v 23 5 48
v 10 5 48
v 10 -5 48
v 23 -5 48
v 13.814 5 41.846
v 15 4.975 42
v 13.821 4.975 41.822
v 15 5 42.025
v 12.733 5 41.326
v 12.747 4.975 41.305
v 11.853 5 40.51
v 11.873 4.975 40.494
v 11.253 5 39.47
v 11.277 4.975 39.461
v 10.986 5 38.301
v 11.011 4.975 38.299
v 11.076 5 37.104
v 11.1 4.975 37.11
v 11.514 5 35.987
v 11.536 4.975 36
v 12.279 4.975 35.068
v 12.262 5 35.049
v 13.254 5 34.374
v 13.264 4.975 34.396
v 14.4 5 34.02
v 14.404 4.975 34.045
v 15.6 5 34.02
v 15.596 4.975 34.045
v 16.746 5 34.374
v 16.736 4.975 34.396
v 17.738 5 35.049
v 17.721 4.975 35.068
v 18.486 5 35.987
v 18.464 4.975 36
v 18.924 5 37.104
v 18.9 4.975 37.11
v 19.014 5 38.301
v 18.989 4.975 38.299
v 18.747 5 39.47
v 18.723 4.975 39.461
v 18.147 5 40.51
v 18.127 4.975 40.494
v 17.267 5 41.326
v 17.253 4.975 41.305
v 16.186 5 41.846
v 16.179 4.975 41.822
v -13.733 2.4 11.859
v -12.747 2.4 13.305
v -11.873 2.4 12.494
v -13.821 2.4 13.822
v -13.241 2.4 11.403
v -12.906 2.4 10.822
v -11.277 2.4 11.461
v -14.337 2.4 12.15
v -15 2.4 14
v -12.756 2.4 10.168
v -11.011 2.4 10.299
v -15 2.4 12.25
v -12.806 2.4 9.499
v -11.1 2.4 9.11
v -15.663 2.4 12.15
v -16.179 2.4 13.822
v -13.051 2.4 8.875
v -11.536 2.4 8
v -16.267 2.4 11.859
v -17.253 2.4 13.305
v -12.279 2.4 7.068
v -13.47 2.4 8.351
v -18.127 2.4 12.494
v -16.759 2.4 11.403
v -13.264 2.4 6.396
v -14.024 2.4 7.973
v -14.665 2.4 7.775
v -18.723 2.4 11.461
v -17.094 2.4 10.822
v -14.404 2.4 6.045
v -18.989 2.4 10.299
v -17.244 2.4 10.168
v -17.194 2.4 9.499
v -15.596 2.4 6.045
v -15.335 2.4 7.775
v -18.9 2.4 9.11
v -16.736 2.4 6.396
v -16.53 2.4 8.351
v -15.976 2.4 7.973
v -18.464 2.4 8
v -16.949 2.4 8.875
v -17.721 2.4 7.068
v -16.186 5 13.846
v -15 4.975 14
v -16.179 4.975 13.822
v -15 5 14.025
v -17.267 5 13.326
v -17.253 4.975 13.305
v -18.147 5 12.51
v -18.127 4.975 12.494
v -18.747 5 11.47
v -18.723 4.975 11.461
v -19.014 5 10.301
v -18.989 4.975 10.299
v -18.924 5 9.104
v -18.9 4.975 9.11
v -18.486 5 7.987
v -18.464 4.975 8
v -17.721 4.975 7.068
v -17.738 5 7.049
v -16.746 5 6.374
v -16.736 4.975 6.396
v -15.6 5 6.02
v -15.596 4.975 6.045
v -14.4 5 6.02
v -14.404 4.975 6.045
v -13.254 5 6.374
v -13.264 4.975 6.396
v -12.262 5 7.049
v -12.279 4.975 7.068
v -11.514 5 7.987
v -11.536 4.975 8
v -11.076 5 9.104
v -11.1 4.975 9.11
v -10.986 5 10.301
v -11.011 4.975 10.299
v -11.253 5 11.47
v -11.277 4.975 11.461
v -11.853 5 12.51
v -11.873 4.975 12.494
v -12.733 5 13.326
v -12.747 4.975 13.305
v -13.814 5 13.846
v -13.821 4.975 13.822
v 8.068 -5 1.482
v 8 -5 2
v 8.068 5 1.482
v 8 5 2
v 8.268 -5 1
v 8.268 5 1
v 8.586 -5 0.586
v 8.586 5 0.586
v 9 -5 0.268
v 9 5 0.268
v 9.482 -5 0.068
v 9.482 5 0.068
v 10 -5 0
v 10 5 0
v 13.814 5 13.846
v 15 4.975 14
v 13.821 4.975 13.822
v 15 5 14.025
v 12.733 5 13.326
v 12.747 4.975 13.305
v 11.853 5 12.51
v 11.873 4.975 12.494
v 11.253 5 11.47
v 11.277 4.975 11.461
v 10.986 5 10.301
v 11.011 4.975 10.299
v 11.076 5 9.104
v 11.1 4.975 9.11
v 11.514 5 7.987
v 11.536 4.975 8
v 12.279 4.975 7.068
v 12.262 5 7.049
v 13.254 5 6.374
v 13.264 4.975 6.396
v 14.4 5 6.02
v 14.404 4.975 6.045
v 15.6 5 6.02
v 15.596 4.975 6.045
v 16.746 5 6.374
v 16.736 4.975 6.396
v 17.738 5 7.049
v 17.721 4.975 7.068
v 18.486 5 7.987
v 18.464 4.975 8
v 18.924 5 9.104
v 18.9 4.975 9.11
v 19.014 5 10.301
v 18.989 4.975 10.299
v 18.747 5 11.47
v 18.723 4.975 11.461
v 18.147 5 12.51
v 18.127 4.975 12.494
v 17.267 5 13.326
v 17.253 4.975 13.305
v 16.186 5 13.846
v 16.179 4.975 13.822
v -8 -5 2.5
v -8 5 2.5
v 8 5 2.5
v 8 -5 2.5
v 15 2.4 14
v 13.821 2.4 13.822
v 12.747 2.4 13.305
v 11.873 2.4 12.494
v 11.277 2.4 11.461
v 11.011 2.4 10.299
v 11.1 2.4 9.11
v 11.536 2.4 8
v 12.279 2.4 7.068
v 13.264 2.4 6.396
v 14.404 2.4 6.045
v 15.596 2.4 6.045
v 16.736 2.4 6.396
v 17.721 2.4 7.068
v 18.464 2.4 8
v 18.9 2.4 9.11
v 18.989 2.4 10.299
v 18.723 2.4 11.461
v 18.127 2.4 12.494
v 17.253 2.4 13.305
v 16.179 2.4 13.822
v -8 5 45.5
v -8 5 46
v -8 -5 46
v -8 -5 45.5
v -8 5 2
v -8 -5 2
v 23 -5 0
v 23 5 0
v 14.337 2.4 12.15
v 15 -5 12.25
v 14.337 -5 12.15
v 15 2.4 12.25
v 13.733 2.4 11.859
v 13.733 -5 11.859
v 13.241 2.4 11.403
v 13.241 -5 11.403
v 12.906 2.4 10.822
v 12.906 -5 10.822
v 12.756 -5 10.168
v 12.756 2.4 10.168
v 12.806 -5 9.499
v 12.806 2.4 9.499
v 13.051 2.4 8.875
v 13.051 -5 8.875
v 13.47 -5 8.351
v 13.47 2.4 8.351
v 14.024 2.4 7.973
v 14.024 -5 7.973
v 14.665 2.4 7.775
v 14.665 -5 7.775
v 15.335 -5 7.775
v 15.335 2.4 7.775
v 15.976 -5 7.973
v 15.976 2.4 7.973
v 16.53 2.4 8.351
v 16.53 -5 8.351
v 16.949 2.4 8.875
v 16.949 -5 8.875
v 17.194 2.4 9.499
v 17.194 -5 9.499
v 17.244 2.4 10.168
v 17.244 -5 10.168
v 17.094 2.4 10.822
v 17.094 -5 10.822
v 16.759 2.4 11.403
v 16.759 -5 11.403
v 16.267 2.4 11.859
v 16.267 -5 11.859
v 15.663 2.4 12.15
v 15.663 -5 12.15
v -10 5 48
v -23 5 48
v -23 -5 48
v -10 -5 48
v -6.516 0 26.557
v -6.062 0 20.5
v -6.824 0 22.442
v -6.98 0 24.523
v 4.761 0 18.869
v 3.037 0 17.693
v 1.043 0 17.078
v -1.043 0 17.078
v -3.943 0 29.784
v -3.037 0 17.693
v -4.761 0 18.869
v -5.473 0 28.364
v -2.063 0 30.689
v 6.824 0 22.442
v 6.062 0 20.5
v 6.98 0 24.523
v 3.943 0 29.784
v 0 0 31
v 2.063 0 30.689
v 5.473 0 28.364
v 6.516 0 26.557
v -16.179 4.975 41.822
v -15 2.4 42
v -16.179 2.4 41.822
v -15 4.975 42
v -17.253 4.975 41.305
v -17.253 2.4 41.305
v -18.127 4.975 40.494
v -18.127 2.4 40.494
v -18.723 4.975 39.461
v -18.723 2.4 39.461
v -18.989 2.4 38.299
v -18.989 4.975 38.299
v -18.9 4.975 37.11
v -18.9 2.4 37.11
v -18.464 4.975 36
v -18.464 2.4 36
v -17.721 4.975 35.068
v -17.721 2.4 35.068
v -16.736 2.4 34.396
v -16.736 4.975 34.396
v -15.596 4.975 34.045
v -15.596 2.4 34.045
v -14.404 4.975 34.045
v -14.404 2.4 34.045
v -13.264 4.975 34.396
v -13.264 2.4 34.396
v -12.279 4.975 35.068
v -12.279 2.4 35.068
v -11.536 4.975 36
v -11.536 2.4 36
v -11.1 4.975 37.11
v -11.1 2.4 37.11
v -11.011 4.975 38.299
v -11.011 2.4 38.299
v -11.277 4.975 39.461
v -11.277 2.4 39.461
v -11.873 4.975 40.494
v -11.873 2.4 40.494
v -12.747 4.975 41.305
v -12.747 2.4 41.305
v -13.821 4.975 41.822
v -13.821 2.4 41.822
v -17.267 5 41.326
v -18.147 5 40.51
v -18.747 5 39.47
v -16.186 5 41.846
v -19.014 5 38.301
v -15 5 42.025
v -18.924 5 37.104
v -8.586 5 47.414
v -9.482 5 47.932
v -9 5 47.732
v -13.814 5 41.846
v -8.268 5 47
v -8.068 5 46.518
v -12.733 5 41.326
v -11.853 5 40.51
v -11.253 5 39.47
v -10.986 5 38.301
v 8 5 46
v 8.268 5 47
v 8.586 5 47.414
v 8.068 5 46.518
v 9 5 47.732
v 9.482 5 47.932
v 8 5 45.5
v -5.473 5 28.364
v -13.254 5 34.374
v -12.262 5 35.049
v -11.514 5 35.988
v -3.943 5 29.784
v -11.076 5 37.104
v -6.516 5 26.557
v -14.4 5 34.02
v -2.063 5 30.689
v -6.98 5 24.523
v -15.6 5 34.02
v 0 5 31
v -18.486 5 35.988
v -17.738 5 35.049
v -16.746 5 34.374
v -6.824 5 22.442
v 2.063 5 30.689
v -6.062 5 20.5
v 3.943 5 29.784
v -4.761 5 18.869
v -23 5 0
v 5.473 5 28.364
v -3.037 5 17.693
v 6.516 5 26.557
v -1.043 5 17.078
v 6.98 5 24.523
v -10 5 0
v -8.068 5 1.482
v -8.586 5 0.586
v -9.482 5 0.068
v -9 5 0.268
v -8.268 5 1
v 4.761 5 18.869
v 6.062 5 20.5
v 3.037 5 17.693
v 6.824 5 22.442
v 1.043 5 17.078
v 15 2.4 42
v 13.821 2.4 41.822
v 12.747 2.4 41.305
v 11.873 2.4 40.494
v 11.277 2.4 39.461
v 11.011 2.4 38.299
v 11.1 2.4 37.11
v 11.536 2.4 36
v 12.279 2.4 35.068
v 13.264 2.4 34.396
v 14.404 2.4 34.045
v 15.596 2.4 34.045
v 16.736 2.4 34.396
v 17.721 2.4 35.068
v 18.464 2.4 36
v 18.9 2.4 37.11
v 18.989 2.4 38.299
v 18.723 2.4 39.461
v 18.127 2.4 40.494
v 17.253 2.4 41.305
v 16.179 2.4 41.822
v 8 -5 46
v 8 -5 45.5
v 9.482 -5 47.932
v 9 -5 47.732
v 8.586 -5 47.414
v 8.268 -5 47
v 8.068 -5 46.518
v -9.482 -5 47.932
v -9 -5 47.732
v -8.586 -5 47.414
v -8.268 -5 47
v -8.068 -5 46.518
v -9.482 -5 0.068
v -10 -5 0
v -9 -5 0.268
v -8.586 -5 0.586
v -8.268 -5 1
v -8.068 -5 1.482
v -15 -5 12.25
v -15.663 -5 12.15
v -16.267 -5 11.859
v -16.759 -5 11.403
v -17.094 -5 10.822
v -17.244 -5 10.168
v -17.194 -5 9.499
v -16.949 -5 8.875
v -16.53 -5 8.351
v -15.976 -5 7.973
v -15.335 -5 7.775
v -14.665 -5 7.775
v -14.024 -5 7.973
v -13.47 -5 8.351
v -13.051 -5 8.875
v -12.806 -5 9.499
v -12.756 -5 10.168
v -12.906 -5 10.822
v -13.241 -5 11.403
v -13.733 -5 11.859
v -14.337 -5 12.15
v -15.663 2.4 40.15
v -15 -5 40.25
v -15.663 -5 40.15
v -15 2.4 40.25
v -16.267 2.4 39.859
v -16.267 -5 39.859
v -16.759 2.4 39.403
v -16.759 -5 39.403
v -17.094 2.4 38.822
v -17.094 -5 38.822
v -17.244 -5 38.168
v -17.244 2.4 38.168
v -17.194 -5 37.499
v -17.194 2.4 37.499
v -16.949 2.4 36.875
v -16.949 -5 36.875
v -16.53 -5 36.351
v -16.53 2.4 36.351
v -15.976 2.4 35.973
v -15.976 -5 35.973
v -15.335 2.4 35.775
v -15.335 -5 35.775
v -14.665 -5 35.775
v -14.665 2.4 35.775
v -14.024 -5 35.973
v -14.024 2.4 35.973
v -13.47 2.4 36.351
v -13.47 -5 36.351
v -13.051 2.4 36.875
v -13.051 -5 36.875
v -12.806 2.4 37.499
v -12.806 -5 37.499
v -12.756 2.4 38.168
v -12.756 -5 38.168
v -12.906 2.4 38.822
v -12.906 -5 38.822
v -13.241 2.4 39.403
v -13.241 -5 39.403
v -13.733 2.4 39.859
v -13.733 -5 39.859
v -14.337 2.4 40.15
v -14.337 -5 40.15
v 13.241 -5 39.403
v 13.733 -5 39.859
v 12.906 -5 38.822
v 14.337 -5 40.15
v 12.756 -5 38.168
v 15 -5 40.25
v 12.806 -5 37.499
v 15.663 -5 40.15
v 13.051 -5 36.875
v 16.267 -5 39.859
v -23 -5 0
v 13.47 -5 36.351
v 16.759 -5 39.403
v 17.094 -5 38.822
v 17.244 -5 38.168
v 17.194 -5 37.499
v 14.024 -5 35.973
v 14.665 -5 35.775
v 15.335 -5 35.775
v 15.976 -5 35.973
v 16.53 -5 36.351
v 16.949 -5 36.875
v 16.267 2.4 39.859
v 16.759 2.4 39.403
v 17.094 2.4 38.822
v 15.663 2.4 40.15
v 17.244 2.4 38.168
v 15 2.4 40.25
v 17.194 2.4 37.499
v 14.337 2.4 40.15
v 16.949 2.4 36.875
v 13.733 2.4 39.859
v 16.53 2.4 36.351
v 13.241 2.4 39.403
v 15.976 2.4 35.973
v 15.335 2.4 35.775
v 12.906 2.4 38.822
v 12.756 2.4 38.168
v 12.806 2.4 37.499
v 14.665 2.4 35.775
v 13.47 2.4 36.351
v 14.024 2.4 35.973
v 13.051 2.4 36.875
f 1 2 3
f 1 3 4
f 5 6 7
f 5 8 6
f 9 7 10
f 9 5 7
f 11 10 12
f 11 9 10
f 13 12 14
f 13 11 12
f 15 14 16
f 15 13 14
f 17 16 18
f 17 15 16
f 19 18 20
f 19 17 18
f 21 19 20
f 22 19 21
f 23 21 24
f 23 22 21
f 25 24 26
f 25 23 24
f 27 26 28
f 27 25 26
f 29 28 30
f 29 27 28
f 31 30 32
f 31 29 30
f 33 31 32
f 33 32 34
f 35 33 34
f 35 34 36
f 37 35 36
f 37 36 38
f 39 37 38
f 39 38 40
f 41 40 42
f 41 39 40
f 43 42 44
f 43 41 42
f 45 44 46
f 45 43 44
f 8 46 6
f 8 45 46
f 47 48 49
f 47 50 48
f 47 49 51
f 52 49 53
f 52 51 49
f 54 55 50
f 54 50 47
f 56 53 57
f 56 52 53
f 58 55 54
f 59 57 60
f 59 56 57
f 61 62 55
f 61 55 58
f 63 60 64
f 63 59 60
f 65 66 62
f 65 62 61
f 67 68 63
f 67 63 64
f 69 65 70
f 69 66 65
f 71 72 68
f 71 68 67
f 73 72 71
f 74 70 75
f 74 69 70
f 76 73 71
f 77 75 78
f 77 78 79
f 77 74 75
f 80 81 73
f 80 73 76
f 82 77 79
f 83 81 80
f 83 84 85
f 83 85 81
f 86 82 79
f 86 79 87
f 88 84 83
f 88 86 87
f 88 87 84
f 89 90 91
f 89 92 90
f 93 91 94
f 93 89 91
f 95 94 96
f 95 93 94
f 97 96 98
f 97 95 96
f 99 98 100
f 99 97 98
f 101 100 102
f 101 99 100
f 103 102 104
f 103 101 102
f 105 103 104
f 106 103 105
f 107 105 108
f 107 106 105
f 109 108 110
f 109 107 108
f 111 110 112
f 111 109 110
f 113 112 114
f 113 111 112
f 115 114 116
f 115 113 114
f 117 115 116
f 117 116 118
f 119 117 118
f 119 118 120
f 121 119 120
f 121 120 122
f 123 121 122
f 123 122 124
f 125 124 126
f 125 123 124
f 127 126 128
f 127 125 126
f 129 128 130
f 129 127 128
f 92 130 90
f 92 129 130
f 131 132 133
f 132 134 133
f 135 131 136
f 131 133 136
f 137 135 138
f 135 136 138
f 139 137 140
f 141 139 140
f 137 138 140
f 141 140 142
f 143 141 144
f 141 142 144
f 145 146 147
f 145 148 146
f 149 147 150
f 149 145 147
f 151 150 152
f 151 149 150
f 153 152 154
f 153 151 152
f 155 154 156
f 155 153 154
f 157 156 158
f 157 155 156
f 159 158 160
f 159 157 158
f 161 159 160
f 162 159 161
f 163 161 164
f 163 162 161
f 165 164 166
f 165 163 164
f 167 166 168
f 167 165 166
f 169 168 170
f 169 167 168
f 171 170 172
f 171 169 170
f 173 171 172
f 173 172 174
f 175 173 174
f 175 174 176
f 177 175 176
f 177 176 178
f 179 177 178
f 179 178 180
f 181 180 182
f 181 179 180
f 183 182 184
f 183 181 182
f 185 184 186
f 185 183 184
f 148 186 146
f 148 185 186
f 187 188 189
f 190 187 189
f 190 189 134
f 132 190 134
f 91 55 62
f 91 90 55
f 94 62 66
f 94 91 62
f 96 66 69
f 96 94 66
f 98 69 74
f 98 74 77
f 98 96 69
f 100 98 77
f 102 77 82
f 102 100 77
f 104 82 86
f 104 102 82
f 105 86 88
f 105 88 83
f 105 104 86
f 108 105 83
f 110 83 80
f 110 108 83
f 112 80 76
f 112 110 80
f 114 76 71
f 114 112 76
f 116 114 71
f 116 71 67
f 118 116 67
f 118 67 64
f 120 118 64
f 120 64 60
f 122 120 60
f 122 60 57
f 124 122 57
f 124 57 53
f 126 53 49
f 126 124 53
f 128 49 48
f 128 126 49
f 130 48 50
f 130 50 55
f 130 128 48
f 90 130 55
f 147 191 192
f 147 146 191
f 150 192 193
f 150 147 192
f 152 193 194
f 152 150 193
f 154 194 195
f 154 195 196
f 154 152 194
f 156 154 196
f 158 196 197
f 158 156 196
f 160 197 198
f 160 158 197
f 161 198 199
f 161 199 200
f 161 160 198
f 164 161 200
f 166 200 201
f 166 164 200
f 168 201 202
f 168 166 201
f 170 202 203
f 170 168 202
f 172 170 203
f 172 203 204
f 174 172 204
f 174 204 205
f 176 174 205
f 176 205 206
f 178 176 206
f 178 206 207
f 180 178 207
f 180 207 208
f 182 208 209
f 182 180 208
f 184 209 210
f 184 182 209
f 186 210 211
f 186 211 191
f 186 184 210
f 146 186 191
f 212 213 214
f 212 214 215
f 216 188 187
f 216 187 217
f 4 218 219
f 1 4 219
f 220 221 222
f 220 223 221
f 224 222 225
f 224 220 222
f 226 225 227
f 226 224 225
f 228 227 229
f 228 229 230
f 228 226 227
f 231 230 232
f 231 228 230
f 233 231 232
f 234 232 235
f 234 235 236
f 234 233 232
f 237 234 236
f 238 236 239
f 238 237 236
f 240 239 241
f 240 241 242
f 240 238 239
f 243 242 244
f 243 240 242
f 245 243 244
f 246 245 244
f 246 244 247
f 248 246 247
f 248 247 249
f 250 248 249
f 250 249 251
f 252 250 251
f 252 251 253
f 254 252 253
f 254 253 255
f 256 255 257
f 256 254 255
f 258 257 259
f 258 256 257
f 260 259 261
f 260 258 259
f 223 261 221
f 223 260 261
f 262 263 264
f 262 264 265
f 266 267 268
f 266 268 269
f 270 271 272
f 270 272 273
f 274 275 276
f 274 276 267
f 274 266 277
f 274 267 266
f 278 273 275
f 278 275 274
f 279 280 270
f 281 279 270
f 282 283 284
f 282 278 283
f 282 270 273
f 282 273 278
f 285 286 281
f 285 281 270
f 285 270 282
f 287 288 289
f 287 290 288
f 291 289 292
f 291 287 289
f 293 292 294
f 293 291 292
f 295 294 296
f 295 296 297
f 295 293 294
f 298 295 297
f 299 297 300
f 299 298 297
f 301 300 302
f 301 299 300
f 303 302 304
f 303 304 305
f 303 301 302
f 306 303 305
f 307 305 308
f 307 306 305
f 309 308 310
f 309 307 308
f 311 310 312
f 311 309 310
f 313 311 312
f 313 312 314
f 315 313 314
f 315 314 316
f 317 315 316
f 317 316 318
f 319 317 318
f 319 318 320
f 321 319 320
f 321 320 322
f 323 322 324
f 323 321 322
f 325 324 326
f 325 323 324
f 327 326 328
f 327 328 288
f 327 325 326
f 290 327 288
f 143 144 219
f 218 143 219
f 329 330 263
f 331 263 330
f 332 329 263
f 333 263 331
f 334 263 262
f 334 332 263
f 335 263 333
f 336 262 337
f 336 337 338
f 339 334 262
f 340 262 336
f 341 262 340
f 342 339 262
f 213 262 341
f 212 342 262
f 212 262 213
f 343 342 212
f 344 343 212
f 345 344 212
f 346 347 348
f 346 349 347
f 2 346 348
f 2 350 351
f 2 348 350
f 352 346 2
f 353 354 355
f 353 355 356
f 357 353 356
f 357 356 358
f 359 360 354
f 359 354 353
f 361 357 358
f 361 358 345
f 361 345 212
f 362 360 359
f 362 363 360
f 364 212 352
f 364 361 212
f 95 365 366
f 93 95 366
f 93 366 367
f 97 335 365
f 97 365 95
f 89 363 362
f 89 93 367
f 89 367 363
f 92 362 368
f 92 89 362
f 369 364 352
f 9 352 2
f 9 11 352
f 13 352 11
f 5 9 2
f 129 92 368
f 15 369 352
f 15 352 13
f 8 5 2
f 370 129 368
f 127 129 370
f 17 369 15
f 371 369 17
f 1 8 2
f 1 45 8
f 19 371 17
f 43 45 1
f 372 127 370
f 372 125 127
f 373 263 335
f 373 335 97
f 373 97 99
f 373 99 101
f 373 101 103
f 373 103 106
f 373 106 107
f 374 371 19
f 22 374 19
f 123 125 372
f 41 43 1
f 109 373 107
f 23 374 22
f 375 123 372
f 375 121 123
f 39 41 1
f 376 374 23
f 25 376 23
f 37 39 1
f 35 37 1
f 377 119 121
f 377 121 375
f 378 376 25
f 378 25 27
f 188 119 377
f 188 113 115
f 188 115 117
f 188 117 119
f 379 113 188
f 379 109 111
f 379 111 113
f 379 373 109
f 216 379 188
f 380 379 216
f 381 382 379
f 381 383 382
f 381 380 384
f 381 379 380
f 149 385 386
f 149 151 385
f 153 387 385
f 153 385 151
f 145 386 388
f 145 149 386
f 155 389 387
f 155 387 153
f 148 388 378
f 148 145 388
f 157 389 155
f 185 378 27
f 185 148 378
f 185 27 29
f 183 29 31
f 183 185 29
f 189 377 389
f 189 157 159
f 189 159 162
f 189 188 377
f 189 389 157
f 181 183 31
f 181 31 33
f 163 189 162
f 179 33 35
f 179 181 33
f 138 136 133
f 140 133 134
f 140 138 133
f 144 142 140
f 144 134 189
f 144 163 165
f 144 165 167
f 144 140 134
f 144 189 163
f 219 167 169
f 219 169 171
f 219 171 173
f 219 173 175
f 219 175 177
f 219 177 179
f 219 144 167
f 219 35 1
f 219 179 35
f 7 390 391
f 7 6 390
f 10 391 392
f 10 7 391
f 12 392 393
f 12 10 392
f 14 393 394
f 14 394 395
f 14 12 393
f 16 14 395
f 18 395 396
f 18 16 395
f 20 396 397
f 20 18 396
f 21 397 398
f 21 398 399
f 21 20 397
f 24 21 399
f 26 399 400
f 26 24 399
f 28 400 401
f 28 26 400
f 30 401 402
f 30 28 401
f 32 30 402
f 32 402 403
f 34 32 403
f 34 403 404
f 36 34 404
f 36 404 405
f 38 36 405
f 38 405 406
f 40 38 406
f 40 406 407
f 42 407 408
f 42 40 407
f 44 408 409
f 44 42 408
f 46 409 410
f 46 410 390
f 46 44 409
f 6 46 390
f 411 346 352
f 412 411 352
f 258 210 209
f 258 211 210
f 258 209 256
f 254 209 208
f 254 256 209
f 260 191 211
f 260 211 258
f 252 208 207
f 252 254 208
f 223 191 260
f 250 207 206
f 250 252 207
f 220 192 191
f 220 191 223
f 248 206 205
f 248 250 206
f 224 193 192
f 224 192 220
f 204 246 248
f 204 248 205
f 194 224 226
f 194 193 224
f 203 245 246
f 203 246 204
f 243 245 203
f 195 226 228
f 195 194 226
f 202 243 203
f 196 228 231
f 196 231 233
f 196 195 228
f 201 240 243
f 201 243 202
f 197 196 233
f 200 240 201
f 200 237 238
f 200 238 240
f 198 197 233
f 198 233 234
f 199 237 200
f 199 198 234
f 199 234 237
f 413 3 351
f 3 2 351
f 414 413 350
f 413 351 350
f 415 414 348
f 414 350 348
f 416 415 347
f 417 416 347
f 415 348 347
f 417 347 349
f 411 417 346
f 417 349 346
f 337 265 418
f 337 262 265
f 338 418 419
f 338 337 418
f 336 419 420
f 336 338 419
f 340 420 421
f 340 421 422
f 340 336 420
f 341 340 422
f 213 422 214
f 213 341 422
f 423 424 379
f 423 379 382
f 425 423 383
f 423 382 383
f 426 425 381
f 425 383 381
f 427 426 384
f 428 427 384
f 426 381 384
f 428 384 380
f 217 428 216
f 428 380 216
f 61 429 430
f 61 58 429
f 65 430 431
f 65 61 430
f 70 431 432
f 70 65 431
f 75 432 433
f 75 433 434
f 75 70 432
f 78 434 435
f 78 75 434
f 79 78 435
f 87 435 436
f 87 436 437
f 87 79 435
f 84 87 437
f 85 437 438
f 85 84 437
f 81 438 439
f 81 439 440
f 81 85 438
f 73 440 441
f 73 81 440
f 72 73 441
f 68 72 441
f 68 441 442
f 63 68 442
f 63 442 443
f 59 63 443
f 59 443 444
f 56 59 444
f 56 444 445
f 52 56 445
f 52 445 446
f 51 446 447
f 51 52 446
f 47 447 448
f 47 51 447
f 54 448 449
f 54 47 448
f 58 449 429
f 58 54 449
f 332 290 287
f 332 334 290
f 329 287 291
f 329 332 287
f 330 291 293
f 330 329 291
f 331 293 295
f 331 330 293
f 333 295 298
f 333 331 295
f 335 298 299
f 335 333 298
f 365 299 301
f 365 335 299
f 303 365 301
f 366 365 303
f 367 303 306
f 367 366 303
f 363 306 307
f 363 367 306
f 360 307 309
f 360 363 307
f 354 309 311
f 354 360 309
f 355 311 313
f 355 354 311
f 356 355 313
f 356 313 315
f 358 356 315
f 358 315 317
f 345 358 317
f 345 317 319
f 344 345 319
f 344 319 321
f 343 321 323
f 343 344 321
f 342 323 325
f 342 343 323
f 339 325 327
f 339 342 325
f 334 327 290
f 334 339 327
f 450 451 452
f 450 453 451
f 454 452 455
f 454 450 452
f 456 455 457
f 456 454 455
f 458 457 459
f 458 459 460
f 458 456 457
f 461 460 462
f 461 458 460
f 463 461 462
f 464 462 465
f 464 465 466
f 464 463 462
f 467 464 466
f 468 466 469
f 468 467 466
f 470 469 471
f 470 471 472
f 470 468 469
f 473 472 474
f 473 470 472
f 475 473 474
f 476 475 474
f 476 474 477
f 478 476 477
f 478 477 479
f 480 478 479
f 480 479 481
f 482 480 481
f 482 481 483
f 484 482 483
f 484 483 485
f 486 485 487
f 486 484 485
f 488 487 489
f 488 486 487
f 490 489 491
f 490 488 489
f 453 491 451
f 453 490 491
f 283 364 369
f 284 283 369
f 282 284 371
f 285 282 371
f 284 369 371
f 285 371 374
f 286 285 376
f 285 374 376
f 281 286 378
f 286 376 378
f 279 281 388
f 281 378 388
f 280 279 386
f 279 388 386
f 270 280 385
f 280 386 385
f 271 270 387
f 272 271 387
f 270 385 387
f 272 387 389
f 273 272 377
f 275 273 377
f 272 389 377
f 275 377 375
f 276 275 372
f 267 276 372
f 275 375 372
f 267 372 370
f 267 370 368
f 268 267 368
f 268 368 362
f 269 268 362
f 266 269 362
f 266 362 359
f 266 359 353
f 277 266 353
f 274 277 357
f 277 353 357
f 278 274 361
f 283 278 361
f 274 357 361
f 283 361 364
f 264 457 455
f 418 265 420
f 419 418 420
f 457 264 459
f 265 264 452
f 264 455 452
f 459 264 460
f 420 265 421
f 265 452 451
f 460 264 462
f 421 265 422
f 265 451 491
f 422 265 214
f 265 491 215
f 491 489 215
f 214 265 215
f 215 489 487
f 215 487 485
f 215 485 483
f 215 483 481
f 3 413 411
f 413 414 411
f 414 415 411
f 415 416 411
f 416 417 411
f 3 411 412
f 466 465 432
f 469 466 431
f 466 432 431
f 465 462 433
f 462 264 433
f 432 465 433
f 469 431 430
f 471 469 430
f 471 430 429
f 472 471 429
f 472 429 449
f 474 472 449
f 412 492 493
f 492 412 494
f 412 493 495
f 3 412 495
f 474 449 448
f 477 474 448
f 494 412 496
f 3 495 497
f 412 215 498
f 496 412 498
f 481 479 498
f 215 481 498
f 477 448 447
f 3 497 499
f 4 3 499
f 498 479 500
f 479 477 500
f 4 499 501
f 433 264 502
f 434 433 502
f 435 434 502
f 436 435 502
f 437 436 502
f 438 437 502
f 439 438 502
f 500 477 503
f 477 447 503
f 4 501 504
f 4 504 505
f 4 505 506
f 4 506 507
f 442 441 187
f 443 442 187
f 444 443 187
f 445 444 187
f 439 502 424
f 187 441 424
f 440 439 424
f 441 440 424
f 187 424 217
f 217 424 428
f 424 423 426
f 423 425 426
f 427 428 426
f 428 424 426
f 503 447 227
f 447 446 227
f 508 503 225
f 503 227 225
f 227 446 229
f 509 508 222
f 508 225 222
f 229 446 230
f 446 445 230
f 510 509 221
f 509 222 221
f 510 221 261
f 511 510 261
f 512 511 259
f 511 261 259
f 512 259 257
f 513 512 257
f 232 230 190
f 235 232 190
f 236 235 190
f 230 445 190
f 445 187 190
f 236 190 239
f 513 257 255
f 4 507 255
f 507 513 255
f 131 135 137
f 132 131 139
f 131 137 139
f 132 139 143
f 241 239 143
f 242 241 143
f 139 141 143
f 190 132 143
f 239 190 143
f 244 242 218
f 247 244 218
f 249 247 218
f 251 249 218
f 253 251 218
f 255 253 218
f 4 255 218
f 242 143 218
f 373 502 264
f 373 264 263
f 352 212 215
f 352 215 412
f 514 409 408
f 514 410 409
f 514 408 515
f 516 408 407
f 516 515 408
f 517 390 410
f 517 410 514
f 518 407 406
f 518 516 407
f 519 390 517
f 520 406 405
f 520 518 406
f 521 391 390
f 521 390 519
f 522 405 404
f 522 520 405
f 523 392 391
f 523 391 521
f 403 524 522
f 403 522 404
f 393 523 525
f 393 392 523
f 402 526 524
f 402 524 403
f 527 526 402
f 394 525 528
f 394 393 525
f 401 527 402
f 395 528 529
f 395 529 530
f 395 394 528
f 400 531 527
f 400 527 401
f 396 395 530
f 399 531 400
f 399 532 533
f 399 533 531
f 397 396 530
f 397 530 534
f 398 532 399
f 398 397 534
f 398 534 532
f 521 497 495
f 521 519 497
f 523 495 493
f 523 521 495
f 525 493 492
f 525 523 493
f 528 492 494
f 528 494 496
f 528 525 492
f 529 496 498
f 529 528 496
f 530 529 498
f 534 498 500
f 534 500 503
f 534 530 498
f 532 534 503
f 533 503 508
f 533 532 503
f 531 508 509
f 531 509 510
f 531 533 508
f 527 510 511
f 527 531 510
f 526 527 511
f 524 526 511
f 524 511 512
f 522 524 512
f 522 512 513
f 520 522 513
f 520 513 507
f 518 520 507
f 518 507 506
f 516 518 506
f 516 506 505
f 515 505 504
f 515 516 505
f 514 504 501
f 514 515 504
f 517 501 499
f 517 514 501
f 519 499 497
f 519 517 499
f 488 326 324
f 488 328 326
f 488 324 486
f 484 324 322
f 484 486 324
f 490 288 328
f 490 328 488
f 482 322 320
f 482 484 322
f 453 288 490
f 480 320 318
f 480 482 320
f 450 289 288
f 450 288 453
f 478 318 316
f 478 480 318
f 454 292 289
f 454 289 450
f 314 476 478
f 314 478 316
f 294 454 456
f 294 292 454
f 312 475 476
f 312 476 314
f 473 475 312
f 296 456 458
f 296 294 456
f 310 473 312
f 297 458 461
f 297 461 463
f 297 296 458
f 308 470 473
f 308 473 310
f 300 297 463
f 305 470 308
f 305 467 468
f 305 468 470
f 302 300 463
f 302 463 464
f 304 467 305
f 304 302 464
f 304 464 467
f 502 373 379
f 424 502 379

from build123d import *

# Parameters (mm, degrees)
SKETCH1_W                                  = 46
SKETCH1_H                                  = 10
BOSS_EXTRUDE1_DEPTH                        = 48
SKETCH2_W                                  = 16
SKETCH2_H                                  = 5
CUT_EXTRUDE1_DEPTH                         = 10
FILLET1_R                                  = 2
CBORE_FOR_M4_CHEESE_HEAD_SCREW1_AT_2_COUNT = 2
CBORE_FOR_M4_CHEESE_HEAD_SCREW1_AT_2_PITCH = 28
CBORE_FOR_M4_CHEESE_HEAD_SCREW1_AT_3_COUNT = 2
CBORE_FOR_M4_CHEESE_HEAD_SCREW1_AT_3_PITCH = 41.036569057
CBORE_FOR_M4_CHEESE_HEAD_SCREW1_AT_4_COUNT = 2
CBORE_FOR_M4_CHEESE_HEAD_SCREW1_AT_4_PITCH = 30
SKETCH6_R                                  = 7
CUT_EXTRUDE2_DEPTH                         = 5


with BuildPart() as part:
    # Sketch1 → Boss-Extrude1 (new body)
    with BuildSketch(Plane.XY):
        Rectangle(SKETCH1_W, SKETCH1_H)
    extrude(amount=BOSS_EXTRUDE1_DEPTH)

    # Sketch2 → Cut-Extrude1 (cut)
    with BuildSketch(Plane(origin=(0, 5, 0), x_dir=(1, 0, 0), z_dir=(0, 1, 0))):
        with Locations((0, -48)):
            Rectangle(SKETCH2_W, SKETCH2_H)
        Rectangle(SKETCH2_W, SKETCH2_H)
    extrude(amount=-CUT_EXTRUDE1_DEPTH, mode=Mode.SUBTRACT)

    # Fillet1
    fillet1_edges = [part.edges().sort_by_distance(p)[0] for p in [
        (-8, 0, 0),
        (8, 0, 0),
        (8, 0, 48),
        (-8, 0, 48),
    ]]
    fillet(fillet1_edges, radius=FILLET1_R)

    # Sketch4 → CBORE for M4 Cheese Head Screw1 (revolve, cut)
    with BuildSketch(Plane(origin=(-15, 5, 10), x_dir=(0, 0, 1), z_dir=(1, 0, 0))):
        Polygon((0, 0), (0, 11.351936393), (2.25, 10), (2.25, 2.6), (4, 2.6), (4, 0.025), (4.025, 0), align=None)
    cbore_for_m4_cheese_head_screw1 = revolve(axis=Axis((-15, 11.35, 10), (0, -1, 0)), mode=Mode.SUBTRACT)

    # CBORE for M4 Cheese Head Screw1 at 2: CBORE for M4 Cheese Head Screw1 ×2
    with Locations(*[(0, 0, i * CBORE_FOR_M4_CHEESE_HEAD_SCREW1_AT_2_PITCH) for i in range(1, CBORE_FOR_M4_CHEESE_HEAD_SCREW1_AT_2_COUNT)]):
        add(cbore_for_m4_cheese_head_screw1, mode=Mode.SUBTRACT)

    # CBORE for M4 Cheese Head Screw1 at 3: CBORE for M4 Cheese Head Screw1 ×2
    with Locations(*[Vector(0.731055268242869, 0, 0.6823182503600111) * (i * CBORE_FOR_M4_CHEESE_HEAD_SCREW1_AT_3_PITCH) for i in range(1, CBORE_FOR_M4_CHEESE_HEAD_SCREW1_AT_3_COUNT)]):
        add(cbore_for_m4_cheese_head_screw1, mode=Mode.SUBTRACT)

    # CBORE for M4 Cheese Head Screw1 at 4: CBORE for M4 Cheese Head Screw1 ×2
    with Locations(*[(i * CBORE_FOR_M4_CHEESE_HEAD_SCREW1_AT_4_PITCH, 0, 0) for i in range(1, CBORE_FOR_M4_CHEESE_HEAD_SCREW1_AT_4_COUNT)]):
        add(cbore_for_m4_cheese_head_screw1, mode=Mode.SUBTRACT)

    # Sketch6 → Cut-Extrude2 (cut)
    with BuildSketch(Plane(origin=(0, 5, 0), x_dir=(1, 0, 0), z_dir=(0, 1, 0))):
        with Locations(Location((0, -24, 0), (0, 0, 270))):
            Circle(SKETCH6_R)
    extrude(amount=-CUT_EXTRUDE2_DEPTH, mode=Mode.SUBTRACT)


solid = part.part
